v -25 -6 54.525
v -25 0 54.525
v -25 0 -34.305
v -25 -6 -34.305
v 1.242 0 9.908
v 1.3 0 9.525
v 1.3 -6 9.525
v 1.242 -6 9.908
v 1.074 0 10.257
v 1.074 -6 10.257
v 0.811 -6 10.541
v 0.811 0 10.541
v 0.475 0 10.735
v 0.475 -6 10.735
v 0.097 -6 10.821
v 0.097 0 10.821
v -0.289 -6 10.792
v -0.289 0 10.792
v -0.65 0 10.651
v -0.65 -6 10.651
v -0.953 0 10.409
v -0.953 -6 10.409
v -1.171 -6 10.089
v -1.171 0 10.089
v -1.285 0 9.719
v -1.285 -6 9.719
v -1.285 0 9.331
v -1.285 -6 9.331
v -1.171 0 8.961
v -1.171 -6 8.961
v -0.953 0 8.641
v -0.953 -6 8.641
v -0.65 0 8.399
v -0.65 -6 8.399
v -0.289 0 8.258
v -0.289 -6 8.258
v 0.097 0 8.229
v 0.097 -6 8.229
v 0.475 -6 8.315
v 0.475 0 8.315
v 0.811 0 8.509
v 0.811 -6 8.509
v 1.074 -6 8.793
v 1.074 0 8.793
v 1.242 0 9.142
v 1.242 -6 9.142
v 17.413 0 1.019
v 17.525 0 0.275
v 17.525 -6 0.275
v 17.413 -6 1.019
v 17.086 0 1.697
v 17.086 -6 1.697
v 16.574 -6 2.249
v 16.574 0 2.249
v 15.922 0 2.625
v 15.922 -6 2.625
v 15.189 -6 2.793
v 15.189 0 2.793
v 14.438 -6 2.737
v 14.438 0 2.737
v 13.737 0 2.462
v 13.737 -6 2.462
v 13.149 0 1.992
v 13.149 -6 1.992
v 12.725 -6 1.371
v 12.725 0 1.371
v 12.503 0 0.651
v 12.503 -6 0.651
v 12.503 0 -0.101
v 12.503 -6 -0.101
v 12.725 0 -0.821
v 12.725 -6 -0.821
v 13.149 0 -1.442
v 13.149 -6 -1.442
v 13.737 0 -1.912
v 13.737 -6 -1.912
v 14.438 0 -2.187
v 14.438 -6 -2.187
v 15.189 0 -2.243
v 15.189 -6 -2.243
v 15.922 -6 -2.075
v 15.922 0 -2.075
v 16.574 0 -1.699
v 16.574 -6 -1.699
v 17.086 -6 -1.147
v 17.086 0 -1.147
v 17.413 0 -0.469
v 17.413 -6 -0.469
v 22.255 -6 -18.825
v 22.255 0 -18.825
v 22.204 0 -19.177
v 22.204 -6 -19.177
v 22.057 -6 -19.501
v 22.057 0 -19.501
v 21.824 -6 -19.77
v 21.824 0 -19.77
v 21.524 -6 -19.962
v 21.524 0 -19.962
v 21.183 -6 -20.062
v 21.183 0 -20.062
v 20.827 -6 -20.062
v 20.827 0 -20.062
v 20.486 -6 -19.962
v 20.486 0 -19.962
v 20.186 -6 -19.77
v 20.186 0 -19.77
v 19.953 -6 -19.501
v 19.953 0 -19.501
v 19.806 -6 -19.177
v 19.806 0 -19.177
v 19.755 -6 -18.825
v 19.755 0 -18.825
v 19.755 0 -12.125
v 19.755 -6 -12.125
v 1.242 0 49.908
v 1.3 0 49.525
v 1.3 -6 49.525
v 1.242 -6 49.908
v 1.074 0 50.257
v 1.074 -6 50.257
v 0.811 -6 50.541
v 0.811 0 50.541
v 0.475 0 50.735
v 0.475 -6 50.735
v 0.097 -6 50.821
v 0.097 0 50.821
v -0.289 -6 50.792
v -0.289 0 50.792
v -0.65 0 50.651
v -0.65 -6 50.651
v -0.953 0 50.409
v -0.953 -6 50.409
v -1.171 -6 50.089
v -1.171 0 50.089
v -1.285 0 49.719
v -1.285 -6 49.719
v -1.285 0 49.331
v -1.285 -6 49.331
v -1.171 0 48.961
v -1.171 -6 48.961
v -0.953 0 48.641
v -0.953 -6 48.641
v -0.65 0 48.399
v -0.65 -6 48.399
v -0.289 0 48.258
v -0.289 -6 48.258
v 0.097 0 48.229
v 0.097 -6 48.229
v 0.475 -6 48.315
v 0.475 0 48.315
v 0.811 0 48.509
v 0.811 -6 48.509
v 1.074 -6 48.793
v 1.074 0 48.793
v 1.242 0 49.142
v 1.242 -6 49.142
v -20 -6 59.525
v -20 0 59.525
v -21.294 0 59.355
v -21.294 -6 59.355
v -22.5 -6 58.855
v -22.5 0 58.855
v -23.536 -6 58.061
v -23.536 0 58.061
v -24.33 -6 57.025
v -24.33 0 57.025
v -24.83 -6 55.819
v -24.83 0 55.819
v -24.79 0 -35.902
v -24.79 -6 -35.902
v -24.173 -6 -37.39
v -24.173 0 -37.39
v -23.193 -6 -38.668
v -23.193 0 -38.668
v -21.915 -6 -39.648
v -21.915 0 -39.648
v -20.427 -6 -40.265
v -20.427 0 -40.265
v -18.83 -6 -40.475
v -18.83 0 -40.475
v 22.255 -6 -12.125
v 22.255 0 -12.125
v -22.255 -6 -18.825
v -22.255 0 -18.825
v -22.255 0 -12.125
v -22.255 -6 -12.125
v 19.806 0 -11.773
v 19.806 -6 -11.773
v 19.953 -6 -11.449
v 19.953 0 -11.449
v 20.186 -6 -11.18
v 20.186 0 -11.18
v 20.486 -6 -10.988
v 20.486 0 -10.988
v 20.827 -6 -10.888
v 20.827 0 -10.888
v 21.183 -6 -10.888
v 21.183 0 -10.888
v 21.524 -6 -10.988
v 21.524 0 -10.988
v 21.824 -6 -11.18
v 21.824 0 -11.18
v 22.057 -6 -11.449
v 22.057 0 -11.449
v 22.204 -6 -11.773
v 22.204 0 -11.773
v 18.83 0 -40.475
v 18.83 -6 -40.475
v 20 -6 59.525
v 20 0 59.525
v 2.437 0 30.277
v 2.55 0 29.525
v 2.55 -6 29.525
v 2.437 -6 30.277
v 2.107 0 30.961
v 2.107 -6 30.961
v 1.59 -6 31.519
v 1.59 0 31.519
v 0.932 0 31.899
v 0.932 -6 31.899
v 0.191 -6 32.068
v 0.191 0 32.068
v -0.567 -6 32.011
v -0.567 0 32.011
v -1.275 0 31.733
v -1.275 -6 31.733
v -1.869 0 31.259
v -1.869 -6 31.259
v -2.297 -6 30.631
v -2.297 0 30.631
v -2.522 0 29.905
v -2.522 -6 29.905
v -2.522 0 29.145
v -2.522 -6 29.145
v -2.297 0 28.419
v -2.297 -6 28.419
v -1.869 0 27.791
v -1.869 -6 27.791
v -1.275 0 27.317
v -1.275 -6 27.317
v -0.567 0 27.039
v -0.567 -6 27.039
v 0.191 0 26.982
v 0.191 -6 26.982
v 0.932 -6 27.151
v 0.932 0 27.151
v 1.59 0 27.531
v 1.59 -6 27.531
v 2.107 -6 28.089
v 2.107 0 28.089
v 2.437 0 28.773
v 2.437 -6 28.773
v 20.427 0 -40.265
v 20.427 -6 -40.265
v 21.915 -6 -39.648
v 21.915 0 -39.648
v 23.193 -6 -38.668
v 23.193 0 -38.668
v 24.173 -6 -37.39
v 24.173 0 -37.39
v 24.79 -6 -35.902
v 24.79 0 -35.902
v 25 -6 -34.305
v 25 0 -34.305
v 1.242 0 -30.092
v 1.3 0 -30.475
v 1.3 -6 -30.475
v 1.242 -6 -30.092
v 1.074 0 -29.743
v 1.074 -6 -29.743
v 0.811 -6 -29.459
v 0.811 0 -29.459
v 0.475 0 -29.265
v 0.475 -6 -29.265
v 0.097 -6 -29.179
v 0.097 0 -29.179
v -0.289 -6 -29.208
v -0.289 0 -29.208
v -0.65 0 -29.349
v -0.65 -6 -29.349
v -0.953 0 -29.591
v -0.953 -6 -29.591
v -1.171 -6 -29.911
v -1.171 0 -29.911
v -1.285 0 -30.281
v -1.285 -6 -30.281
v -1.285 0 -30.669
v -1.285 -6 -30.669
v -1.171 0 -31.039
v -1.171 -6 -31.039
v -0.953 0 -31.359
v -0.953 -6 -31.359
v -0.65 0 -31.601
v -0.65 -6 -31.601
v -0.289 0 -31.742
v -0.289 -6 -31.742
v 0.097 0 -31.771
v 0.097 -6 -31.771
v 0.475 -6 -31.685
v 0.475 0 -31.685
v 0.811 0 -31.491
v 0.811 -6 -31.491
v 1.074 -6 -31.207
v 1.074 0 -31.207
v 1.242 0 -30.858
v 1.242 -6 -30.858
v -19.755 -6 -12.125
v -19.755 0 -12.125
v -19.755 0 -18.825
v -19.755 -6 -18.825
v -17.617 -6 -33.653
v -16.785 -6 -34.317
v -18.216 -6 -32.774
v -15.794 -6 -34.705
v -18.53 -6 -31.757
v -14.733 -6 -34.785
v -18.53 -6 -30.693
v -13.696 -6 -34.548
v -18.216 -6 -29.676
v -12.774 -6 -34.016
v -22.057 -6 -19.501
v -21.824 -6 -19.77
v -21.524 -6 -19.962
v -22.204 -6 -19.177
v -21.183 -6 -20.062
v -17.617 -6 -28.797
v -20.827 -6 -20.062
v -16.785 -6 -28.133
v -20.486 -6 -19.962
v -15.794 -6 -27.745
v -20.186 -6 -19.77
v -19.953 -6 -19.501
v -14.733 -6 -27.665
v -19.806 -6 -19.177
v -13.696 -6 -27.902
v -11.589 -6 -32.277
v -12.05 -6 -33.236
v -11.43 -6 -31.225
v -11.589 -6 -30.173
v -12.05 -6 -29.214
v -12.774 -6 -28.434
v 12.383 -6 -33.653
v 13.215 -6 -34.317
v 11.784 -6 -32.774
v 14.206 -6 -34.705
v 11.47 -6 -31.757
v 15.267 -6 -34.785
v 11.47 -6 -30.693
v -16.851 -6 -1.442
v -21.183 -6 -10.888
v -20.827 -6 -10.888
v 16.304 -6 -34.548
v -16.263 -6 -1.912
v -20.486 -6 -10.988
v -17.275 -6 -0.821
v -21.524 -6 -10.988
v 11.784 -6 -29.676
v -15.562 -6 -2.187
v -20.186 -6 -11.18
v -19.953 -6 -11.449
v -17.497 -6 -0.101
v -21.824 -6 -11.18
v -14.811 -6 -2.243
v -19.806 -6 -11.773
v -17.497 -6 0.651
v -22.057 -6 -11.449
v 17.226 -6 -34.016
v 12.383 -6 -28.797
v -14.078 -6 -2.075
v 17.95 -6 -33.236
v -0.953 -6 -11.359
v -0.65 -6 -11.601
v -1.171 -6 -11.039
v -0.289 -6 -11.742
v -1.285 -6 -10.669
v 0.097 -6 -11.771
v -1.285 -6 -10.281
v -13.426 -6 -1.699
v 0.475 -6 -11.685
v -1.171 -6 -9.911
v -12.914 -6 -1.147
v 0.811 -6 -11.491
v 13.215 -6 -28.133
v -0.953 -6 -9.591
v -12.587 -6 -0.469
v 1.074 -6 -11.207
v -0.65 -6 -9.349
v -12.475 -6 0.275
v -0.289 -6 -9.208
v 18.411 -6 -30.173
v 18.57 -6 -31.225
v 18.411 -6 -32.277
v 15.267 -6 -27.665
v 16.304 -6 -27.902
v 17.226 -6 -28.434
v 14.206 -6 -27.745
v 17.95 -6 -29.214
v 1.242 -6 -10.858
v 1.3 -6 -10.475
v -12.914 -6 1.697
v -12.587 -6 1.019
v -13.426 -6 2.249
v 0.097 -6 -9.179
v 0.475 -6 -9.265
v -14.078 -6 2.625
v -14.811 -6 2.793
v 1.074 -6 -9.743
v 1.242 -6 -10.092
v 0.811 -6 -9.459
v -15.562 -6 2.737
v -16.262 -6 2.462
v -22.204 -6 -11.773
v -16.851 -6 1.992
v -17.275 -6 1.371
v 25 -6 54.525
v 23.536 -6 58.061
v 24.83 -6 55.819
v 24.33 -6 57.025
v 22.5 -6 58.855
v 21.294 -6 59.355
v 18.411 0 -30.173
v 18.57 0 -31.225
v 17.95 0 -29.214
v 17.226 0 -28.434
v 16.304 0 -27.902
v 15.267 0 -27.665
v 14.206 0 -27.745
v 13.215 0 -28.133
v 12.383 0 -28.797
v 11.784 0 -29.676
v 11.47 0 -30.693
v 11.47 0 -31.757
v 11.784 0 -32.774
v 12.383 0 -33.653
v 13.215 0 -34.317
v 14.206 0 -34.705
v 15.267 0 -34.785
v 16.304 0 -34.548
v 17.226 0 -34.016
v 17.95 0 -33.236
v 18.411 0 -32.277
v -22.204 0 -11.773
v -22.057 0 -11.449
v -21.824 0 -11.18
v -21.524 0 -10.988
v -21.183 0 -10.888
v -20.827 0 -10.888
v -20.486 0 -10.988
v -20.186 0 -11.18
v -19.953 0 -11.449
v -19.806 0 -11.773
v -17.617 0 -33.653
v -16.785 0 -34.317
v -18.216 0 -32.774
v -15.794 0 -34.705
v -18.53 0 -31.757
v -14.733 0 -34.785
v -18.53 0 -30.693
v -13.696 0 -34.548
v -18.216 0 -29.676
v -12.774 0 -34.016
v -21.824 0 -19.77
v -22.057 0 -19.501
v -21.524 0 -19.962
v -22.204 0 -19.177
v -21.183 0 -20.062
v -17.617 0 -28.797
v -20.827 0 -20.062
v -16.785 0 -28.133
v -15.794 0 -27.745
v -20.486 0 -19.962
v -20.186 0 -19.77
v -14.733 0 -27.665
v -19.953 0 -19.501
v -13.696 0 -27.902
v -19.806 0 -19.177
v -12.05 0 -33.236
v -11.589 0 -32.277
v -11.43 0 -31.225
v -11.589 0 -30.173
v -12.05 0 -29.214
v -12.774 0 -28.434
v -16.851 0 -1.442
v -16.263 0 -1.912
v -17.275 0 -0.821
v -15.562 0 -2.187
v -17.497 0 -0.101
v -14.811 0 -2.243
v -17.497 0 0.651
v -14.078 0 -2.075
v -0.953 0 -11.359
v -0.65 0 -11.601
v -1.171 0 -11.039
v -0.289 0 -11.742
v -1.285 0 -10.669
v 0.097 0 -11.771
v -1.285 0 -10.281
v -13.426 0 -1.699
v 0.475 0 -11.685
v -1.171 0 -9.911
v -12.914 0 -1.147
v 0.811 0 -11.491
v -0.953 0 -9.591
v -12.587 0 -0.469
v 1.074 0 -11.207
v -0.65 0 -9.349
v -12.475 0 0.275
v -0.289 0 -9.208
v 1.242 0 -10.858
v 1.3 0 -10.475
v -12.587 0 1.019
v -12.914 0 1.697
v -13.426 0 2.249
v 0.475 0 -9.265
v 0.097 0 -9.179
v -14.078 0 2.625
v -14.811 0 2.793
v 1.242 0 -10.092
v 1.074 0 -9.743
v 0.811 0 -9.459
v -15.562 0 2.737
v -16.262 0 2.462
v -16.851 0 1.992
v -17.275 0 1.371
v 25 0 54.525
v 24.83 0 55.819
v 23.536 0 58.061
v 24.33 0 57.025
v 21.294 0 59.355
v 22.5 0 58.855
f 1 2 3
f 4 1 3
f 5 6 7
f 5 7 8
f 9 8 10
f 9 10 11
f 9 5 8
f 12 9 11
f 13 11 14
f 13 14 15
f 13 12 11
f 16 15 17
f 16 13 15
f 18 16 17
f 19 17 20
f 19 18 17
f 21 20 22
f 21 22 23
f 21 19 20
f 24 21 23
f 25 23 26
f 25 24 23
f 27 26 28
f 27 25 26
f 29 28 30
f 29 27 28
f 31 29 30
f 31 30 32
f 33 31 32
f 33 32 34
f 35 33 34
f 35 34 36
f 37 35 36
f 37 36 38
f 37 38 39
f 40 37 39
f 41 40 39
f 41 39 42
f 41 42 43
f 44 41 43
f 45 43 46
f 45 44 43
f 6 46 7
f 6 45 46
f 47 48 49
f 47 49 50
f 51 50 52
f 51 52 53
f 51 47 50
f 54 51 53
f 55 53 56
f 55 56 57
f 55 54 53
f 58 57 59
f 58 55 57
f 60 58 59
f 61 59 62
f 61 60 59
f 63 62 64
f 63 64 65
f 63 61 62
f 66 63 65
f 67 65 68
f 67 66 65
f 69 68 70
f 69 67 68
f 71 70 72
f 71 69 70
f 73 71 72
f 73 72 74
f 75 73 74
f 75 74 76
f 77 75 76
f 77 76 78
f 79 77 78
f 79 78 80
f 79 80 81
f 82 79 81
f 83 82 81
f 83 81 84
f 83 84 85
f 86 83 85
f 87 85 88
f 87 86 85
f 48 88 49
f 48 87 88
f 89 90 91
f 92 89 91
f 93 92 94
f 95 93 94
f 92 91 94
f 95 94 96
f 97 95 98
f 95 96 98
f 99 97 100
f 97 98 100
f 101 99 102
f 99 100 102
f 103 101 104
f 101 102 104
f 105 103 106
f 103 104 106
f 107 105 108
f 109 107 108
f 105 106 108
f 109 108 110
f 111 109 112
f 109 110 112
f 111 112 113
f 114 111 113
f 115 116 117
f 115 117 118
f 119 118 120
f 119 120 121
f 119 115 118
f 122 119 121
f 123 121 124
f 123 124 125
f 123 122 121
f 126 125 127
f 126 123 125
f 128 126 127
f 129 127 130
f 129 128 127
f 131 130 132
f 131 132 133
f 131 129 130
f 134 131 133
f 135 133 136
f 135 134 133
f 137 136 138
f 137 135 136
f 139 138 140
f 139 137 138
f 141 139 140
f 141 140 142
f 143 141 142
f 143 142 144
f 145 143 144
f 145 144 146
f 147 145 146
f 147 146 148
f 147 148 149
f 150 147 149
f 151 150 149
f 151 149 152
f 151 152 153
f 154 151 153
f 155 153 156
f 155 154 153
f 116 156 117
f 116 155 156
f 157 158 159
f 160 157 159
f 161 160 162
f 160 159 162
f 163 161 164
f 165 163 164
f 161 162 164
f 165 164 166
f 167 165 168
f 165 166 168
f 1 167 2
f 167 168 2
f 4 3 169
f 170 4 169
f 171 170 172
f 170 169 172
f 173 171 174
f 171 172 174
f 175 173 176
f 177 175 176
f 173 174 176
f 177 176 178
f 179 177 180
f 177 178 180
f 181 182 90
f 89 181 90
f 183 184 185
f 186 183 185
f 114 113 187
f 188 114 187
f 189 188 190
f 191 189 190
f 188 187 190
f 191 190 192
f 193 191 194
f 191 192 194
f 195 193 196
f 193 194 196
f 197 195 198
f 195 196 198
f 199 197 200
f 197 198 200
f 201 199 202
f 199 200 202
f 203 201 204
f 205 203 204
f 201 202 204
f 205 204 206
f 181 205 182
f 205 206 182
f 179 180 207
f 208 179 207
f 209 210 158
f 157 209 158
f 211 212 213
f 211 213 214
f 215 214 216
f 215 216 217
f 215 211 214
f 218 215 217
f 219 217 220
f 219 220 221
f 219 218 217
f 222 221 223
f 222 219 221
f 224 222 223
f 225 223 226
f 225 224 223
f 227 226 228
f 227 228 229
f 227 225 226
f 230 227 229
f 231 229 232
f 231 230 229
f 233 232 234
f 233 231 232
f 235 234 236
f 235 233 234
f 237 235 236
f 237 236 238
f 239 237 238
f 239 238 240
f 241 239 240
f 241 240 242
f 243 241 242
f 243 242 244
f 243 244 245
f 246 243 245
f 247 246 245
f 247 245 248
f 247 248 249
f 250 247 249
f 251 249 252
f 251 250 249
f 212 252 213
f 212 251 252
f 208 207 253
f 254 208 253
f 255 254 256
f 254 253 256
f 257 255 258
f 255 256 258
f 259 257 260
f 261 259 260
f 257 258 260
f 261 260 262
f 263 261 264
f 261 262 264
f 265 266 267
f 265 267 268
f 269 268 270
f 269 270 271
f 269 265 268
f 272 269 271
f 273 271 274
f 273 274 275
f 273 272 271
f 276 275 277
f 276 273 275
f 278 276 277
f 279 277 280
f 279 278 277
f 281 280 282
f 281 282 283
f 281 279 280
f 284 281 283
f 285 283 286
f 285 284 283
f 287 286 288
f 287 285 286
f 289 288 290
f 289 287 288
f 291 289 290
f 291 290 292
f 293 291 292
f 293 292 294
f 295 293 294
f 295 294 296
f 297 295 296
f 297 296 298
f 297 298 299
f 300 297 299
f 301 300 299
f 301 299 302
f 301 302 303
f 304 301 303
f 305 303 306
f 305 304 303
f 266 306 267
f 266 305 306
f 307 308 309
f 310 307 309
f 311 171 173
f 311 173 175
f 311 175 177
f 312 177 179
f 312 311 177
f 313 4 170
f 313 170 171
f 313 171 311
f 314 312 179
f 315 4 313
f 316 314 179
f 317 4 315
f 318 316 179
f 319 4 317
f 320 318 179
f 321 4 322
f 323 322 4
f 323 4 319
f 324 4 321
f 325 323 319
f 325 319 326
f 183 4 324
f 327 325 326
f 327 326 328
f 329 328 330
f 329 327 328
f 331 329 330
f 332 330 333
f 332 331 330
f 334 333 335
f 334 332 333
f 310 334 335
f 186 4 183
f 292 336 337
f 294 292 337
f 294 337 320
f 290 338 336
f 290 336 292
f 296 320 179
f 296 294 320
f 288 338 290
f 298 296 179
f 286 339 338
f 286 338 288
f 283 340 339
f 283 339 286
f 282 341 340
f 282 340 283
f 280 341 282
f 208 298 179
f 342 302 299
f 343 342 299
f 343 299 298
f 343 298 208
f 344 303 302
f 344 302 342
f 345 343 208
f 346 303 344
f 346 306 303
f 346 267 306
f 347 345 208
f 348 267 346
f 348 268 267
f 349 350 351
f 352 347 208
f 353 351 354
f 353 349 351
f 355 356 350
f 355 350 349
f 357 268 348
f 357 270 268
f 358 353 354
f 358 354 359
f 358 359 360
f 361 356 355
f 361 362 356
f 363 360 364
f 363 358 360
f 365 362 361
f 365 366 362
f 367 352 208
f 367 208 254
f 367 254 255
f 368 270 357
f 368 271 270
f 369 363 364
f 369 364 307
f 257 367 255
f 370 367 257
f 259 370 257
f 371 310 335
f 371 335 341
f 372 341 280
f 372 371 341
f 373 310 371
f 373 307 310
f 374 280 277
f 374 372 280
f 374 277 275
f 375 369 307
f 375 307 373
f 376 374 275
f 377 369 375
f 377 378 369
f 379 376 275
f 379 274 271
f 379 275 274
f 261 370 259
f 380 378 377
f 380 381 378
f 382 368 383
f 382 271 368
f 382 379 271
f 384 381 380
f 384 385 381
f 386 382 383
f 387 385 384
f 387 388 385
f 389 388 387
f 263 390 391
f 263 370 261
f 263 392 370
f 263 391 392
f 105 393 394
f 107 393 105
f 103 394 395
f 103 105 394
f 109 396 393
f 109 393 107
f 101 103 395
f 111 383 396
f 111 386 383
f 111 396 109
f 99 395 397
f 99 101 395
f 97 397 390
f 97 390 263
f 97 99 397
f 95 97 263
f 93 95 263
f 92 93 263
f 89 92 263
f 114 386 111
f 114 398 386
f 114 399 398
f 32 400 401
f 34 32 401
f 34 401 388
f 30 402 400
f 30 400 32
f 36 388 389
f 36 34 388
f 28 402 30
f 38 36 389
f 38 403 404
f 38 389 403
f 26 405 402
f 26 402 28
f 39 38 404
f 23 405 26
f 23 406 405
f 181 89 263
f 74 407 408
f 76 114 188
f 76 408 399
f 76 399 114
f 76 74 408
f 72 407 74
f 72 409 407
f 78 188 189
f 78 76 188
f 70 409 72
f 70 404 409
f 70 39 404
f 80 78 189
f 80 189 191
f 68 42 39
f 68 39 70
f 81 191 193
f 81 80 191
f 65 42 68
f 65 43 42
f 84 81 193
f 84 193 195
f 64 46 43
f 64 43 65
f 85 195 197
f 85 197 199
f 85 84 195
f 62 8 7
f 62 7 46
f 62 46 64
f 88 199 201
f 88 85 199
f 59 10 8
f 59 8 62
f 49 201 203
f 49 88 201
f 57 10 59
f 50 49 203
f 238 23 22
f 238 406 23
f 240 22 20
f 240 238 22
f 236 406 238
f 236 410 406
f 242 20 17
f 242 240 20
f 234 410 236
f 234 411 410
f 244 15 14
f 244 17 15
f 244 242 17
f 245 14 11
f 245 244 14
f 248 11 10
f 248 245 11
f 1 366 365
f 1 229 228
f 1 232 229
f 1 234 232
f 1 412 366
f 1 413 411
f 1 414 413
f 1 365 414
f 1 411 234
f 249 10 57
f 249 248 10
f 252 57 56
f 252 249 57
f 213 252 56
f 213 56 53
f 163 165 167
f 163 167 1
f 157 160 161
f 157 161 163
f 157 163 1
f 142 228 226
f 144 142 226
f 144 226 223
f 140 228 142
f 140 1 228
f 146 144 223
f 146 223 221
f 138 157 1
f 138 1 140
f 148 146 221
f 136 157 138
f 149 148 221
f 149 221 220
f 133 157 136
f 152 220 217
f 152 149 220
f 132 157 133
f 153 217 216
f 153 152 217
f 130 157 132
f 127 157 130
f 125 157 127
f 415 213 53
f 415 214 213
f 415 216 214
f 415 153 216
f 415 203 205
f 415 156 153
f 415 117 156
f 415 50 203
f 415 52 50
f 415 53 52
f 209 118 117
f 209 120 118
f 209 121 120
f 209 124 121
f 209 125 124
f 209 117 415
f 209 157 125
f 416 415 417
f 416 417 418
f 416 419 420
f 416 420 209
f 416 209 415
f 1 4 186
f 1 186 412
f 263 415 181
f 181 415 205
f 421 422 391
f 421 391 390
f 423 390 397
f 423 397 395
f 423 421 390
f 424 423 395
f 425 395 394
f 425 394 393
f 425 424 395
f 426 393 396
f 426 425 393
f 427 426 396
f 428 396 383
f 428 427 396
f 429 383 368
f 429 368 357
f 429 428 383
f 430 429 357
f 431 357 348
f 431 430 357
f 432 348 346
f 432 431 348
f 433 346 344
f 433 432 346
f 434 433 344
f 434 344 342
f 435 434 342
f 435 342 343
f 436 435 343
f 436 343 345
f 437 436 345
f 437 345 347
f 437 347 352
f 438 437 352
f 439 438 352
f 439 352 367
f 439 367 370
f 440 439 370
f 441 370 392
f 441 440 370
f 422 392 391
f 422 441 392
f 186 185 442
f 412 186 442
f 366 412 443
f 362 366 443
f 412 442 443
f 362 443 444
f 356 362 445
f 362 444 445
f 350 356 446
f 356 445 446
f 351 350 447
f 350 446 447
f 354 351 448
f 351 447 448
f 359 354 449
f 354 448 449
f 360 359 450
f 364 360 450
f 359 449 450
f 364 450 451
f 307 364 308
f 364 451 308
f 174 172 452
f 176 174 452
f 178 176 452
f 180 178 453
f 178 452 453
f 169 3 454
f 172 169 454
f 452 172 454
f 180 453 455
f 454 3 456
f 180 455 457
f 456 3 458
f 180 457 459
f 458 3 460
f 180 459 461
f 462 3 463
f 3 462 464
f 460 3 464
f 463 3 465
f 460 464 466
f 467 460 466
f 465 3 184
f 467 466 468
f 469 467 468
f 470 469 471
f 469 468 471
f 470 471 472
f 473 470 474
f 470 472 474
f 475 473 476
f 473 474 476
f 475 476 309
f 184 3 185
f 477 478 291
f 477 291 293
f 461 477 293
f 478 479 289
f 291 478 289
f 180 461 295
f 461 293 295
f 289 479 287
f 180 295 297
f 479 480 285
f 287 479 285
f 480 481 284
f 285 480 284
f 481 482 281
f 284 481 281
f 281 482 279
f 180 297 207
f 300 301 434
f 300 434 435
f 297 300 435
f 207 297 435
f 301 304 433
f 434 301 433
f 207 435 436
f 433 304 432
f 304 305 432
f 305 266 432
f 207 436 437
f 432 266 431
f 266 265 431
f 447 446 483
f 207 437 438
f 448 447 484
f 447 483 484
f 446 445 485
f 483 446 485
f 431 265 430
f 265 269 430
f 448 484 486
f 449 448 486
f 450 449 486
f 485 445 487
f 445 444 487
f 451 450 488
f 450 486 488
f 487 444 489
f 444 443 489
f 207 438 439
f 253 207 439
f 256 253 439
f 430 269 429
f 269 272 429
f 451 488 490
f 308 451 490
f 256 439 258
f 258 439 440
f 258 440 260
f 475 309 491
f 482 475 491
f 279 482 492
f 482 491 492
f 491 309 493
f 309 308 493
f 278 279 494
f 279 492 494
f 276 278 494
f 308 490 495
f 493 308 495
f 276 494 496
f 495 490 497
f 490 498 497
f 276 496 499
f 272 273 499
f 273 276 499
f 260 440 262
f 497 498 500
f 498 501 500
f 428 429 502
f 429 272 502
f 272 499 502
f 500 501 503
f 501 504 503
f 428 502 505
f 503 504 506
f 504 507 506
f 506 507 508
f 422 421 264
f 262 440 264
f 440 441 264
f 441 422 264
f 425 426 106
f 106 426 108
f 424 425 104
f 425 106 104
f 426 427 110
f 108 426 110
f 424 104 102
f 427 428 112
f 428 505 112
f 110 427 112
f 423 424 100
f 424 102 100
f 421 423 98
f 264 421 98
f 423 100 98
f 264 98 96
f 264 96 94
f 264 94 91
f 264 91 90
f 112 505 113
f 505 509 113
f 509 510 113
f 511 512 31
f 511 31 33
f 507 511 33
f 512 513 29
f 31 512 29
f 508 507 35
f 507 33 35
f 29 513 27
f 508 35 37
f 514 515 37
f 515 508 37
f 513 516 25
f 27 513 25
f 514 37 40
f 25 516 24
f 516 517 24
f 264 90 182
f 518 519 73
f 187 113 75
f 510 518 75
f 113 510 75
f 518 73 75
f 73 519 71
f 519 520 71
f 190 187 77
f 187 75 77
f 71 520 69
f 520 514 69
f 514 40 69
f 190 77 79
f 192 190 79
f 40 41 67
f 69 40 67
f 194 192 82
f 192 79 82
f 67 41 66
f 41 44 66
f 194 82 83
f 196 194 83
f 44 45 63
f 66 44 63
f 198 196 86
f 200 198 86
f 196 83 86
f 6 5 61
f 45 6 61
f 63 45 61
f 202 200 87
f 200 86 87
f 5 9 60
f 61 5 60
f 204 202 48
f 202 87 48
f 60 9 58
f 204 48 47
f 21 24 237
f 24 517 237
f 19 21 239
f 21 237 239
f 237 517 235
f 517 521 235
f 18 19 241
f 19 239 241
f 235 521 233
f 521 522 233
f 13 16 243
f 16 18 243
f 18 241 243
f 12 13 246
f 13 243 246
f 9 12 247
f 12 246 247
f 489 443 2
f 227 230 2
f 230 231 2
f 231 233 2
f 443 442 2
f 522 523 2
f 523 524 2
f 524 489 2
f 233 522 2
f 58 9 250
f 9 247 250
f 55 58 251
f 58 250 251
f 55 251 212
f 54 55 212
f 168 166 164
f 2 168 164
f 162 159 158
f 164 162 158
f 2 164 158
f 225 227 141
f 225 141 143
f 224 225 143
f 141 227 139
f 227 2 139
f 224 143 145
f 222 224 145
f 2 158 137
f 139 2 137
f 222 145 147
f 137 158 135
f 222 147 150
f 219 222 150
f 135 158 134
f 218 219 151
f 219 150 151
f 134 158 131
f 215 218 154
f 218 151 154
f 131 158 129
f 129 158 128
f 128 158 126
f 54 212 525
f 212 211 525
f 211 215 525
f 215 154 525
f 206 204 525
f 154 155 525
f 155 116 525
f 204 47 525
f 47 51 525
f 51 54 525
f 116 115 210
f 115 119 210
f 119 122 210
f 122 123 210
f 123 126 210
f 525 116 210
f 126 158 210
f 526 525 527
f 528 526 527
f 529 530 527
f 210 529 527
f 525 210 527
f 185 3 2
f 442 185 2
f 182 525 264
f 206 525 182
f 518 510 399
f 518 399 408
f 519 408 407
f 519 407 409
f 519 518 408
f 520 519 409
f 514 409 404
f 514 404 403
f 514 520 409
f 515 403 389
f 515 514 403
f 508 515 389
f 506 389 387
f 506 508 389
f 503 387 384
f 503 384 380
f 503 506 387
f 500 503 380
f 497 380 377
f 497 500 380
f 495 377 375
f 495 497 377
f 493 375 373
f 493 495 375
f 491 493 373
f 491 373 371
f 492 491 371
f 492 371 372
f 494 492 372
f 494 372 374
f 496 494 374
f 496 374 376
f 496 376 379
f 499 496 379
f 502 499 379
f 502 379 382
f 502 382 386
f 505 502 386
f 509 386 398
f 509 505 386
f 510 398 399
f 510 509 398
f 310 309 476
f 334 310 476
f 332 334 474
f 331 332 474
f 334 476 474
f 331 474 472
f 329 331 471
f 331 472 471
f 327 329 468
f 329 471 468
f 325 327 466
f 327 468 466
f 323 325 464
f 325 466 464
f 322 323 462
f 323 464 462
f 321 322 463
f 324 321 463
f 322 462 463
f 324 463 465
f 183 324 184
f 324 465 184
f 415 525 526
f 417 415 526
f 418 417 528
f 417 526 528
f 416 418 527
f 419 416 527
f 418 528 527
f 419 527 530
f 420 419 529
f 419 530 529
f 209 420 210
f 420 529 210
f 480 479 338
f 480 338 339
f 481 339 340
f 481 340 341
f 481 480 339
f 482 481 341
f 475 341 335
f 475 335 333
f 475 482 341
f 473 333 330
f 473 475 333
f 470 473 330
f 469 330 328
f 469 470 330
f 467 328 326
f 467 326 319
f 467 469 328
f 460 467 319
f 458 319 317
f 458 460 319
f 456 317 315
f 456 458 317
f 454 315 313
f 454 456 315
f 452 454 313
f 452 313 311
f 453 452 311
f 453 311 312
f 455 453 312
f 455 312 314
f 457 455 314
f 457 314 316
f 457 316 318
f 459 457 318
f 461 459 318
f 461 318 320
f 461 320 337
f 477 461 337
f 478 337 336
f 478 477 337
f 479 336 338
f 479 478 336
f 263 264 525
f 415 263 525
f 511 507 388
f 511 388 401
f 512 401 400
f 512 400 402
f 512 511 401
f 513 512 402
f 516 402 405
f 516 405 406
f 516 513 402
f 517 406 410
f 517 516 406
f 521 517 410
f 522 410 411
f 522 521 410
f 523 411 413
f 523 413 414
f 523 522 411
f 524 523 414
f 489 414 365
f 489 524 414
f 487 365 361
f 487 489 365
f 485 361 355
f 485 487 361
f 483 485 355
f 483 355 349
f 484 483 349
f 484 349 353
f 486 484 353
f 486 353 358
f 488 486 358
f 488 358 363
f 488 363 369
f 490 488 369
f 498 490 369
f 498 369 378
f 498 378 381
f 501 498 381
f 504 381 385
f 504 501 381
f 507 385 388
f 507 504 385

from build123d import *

# Parameters (mm, degrees)
F0_R     = 3.57
F0_R_2   = 2.525
F0_R_3   = 1.3
F0_R_4   = 2.55
F1_DEPTH = 6


with BuildPart() as f1:
    # F0 (on Front) → F1 (new body)
    with BuildSketch(Plane.XZ):
        with BuildLine():
            Line((20, 59.525), (18.83, 59.525))
            Line((18.83, 59.525), (-18.83, 59.525))
            Line((-18.83, 59.525), (-20, 59.525))
            ThreePointArc((-20, 59.525), (-23.535534, 58.060534), (-25, 54.525))
            Line((-25, 54.525), (-25, 50.695))
            Line((-25, 50.695), (-25, -34.305))
            ThreePointArc((-25, -34.305), (-23.192849, -38.667849), (-18.83, -40.475))
            Line((-18.83, -40.475), (18.83, -40.475))
            ThreePointArc((18.83, -40.475), (23.192849, -38.667849), (25, -34.305))
            Line((25, -34.305), (25, 50.695))
            Line((25, 50.695), (25, 54.525))
            ThreePointArc((25, 54.525), (23.535534, 58.060534), (20, 59.525))
        make_face()
        with Locations((-15, -31.225)):
            Circle(F0_R, mode=Mode.SUBTRACT)
        with BuildLine():
            Line((-19.755, -12.125), (-19.755, -18.825))
            ThreePointArc((-19.755, -18.825), (-21.005, -20.075), (-22.255, -18.825))
            Line((-22.255, -18.825), (-22.255, -12.125))
            ThreePointArc((-22.255, -12.125), (-21.005, -10.875), (-19.755, -12.125))
        make_face(mode=Mode.SUBTRACT)
        with Locations((-15, 0.275)):
            Circle(F0_R_2, mode=Mode.SUBTRACT)
        with Locations((0, -30.475)):
            Circle(F0_R_3, mode=Mode.SUBTRACT)
        with Locations((15, -31.225)):
            Circle(F0_R, mode=Mode.SUBTRACT)
        with Locations((0, -10.475)):
            Circle(F0_R_3, mode=Mode.SUBTRACT)
        with BuildLine():
            Line((22.255, -12.125), (22.255, -18.825))
            ThreePointArc((22.255, -18.825), (21.005, -20.075), (19.755, -18.825))
            Line((19.755, -18.825), (19.755, -12.125))
            ThreePointArc((19.755, -12.125), (21.005, -10.875), (22.255, -12.125))
        make_face(mode=Mode.SUBTRACT)
        with Locations((15, 0.275)):
            Circle(F0_R_2, mode=Mode.SUBTRACT)
        with Locations((0, 9.525)):
            Circle(F0_R_3, mode=Mode.SUBTRACT)
        with Locations((0, 29.525)):
            Circle(F0_R_4, mode=Mode.SUBTRACT)
        with Locations((0, 49.525)):
            Circle(F0_R_3, mode=Mode.SUBTRACT)
    extrude(amount=F1_DEPTH)


solid = f1.part
